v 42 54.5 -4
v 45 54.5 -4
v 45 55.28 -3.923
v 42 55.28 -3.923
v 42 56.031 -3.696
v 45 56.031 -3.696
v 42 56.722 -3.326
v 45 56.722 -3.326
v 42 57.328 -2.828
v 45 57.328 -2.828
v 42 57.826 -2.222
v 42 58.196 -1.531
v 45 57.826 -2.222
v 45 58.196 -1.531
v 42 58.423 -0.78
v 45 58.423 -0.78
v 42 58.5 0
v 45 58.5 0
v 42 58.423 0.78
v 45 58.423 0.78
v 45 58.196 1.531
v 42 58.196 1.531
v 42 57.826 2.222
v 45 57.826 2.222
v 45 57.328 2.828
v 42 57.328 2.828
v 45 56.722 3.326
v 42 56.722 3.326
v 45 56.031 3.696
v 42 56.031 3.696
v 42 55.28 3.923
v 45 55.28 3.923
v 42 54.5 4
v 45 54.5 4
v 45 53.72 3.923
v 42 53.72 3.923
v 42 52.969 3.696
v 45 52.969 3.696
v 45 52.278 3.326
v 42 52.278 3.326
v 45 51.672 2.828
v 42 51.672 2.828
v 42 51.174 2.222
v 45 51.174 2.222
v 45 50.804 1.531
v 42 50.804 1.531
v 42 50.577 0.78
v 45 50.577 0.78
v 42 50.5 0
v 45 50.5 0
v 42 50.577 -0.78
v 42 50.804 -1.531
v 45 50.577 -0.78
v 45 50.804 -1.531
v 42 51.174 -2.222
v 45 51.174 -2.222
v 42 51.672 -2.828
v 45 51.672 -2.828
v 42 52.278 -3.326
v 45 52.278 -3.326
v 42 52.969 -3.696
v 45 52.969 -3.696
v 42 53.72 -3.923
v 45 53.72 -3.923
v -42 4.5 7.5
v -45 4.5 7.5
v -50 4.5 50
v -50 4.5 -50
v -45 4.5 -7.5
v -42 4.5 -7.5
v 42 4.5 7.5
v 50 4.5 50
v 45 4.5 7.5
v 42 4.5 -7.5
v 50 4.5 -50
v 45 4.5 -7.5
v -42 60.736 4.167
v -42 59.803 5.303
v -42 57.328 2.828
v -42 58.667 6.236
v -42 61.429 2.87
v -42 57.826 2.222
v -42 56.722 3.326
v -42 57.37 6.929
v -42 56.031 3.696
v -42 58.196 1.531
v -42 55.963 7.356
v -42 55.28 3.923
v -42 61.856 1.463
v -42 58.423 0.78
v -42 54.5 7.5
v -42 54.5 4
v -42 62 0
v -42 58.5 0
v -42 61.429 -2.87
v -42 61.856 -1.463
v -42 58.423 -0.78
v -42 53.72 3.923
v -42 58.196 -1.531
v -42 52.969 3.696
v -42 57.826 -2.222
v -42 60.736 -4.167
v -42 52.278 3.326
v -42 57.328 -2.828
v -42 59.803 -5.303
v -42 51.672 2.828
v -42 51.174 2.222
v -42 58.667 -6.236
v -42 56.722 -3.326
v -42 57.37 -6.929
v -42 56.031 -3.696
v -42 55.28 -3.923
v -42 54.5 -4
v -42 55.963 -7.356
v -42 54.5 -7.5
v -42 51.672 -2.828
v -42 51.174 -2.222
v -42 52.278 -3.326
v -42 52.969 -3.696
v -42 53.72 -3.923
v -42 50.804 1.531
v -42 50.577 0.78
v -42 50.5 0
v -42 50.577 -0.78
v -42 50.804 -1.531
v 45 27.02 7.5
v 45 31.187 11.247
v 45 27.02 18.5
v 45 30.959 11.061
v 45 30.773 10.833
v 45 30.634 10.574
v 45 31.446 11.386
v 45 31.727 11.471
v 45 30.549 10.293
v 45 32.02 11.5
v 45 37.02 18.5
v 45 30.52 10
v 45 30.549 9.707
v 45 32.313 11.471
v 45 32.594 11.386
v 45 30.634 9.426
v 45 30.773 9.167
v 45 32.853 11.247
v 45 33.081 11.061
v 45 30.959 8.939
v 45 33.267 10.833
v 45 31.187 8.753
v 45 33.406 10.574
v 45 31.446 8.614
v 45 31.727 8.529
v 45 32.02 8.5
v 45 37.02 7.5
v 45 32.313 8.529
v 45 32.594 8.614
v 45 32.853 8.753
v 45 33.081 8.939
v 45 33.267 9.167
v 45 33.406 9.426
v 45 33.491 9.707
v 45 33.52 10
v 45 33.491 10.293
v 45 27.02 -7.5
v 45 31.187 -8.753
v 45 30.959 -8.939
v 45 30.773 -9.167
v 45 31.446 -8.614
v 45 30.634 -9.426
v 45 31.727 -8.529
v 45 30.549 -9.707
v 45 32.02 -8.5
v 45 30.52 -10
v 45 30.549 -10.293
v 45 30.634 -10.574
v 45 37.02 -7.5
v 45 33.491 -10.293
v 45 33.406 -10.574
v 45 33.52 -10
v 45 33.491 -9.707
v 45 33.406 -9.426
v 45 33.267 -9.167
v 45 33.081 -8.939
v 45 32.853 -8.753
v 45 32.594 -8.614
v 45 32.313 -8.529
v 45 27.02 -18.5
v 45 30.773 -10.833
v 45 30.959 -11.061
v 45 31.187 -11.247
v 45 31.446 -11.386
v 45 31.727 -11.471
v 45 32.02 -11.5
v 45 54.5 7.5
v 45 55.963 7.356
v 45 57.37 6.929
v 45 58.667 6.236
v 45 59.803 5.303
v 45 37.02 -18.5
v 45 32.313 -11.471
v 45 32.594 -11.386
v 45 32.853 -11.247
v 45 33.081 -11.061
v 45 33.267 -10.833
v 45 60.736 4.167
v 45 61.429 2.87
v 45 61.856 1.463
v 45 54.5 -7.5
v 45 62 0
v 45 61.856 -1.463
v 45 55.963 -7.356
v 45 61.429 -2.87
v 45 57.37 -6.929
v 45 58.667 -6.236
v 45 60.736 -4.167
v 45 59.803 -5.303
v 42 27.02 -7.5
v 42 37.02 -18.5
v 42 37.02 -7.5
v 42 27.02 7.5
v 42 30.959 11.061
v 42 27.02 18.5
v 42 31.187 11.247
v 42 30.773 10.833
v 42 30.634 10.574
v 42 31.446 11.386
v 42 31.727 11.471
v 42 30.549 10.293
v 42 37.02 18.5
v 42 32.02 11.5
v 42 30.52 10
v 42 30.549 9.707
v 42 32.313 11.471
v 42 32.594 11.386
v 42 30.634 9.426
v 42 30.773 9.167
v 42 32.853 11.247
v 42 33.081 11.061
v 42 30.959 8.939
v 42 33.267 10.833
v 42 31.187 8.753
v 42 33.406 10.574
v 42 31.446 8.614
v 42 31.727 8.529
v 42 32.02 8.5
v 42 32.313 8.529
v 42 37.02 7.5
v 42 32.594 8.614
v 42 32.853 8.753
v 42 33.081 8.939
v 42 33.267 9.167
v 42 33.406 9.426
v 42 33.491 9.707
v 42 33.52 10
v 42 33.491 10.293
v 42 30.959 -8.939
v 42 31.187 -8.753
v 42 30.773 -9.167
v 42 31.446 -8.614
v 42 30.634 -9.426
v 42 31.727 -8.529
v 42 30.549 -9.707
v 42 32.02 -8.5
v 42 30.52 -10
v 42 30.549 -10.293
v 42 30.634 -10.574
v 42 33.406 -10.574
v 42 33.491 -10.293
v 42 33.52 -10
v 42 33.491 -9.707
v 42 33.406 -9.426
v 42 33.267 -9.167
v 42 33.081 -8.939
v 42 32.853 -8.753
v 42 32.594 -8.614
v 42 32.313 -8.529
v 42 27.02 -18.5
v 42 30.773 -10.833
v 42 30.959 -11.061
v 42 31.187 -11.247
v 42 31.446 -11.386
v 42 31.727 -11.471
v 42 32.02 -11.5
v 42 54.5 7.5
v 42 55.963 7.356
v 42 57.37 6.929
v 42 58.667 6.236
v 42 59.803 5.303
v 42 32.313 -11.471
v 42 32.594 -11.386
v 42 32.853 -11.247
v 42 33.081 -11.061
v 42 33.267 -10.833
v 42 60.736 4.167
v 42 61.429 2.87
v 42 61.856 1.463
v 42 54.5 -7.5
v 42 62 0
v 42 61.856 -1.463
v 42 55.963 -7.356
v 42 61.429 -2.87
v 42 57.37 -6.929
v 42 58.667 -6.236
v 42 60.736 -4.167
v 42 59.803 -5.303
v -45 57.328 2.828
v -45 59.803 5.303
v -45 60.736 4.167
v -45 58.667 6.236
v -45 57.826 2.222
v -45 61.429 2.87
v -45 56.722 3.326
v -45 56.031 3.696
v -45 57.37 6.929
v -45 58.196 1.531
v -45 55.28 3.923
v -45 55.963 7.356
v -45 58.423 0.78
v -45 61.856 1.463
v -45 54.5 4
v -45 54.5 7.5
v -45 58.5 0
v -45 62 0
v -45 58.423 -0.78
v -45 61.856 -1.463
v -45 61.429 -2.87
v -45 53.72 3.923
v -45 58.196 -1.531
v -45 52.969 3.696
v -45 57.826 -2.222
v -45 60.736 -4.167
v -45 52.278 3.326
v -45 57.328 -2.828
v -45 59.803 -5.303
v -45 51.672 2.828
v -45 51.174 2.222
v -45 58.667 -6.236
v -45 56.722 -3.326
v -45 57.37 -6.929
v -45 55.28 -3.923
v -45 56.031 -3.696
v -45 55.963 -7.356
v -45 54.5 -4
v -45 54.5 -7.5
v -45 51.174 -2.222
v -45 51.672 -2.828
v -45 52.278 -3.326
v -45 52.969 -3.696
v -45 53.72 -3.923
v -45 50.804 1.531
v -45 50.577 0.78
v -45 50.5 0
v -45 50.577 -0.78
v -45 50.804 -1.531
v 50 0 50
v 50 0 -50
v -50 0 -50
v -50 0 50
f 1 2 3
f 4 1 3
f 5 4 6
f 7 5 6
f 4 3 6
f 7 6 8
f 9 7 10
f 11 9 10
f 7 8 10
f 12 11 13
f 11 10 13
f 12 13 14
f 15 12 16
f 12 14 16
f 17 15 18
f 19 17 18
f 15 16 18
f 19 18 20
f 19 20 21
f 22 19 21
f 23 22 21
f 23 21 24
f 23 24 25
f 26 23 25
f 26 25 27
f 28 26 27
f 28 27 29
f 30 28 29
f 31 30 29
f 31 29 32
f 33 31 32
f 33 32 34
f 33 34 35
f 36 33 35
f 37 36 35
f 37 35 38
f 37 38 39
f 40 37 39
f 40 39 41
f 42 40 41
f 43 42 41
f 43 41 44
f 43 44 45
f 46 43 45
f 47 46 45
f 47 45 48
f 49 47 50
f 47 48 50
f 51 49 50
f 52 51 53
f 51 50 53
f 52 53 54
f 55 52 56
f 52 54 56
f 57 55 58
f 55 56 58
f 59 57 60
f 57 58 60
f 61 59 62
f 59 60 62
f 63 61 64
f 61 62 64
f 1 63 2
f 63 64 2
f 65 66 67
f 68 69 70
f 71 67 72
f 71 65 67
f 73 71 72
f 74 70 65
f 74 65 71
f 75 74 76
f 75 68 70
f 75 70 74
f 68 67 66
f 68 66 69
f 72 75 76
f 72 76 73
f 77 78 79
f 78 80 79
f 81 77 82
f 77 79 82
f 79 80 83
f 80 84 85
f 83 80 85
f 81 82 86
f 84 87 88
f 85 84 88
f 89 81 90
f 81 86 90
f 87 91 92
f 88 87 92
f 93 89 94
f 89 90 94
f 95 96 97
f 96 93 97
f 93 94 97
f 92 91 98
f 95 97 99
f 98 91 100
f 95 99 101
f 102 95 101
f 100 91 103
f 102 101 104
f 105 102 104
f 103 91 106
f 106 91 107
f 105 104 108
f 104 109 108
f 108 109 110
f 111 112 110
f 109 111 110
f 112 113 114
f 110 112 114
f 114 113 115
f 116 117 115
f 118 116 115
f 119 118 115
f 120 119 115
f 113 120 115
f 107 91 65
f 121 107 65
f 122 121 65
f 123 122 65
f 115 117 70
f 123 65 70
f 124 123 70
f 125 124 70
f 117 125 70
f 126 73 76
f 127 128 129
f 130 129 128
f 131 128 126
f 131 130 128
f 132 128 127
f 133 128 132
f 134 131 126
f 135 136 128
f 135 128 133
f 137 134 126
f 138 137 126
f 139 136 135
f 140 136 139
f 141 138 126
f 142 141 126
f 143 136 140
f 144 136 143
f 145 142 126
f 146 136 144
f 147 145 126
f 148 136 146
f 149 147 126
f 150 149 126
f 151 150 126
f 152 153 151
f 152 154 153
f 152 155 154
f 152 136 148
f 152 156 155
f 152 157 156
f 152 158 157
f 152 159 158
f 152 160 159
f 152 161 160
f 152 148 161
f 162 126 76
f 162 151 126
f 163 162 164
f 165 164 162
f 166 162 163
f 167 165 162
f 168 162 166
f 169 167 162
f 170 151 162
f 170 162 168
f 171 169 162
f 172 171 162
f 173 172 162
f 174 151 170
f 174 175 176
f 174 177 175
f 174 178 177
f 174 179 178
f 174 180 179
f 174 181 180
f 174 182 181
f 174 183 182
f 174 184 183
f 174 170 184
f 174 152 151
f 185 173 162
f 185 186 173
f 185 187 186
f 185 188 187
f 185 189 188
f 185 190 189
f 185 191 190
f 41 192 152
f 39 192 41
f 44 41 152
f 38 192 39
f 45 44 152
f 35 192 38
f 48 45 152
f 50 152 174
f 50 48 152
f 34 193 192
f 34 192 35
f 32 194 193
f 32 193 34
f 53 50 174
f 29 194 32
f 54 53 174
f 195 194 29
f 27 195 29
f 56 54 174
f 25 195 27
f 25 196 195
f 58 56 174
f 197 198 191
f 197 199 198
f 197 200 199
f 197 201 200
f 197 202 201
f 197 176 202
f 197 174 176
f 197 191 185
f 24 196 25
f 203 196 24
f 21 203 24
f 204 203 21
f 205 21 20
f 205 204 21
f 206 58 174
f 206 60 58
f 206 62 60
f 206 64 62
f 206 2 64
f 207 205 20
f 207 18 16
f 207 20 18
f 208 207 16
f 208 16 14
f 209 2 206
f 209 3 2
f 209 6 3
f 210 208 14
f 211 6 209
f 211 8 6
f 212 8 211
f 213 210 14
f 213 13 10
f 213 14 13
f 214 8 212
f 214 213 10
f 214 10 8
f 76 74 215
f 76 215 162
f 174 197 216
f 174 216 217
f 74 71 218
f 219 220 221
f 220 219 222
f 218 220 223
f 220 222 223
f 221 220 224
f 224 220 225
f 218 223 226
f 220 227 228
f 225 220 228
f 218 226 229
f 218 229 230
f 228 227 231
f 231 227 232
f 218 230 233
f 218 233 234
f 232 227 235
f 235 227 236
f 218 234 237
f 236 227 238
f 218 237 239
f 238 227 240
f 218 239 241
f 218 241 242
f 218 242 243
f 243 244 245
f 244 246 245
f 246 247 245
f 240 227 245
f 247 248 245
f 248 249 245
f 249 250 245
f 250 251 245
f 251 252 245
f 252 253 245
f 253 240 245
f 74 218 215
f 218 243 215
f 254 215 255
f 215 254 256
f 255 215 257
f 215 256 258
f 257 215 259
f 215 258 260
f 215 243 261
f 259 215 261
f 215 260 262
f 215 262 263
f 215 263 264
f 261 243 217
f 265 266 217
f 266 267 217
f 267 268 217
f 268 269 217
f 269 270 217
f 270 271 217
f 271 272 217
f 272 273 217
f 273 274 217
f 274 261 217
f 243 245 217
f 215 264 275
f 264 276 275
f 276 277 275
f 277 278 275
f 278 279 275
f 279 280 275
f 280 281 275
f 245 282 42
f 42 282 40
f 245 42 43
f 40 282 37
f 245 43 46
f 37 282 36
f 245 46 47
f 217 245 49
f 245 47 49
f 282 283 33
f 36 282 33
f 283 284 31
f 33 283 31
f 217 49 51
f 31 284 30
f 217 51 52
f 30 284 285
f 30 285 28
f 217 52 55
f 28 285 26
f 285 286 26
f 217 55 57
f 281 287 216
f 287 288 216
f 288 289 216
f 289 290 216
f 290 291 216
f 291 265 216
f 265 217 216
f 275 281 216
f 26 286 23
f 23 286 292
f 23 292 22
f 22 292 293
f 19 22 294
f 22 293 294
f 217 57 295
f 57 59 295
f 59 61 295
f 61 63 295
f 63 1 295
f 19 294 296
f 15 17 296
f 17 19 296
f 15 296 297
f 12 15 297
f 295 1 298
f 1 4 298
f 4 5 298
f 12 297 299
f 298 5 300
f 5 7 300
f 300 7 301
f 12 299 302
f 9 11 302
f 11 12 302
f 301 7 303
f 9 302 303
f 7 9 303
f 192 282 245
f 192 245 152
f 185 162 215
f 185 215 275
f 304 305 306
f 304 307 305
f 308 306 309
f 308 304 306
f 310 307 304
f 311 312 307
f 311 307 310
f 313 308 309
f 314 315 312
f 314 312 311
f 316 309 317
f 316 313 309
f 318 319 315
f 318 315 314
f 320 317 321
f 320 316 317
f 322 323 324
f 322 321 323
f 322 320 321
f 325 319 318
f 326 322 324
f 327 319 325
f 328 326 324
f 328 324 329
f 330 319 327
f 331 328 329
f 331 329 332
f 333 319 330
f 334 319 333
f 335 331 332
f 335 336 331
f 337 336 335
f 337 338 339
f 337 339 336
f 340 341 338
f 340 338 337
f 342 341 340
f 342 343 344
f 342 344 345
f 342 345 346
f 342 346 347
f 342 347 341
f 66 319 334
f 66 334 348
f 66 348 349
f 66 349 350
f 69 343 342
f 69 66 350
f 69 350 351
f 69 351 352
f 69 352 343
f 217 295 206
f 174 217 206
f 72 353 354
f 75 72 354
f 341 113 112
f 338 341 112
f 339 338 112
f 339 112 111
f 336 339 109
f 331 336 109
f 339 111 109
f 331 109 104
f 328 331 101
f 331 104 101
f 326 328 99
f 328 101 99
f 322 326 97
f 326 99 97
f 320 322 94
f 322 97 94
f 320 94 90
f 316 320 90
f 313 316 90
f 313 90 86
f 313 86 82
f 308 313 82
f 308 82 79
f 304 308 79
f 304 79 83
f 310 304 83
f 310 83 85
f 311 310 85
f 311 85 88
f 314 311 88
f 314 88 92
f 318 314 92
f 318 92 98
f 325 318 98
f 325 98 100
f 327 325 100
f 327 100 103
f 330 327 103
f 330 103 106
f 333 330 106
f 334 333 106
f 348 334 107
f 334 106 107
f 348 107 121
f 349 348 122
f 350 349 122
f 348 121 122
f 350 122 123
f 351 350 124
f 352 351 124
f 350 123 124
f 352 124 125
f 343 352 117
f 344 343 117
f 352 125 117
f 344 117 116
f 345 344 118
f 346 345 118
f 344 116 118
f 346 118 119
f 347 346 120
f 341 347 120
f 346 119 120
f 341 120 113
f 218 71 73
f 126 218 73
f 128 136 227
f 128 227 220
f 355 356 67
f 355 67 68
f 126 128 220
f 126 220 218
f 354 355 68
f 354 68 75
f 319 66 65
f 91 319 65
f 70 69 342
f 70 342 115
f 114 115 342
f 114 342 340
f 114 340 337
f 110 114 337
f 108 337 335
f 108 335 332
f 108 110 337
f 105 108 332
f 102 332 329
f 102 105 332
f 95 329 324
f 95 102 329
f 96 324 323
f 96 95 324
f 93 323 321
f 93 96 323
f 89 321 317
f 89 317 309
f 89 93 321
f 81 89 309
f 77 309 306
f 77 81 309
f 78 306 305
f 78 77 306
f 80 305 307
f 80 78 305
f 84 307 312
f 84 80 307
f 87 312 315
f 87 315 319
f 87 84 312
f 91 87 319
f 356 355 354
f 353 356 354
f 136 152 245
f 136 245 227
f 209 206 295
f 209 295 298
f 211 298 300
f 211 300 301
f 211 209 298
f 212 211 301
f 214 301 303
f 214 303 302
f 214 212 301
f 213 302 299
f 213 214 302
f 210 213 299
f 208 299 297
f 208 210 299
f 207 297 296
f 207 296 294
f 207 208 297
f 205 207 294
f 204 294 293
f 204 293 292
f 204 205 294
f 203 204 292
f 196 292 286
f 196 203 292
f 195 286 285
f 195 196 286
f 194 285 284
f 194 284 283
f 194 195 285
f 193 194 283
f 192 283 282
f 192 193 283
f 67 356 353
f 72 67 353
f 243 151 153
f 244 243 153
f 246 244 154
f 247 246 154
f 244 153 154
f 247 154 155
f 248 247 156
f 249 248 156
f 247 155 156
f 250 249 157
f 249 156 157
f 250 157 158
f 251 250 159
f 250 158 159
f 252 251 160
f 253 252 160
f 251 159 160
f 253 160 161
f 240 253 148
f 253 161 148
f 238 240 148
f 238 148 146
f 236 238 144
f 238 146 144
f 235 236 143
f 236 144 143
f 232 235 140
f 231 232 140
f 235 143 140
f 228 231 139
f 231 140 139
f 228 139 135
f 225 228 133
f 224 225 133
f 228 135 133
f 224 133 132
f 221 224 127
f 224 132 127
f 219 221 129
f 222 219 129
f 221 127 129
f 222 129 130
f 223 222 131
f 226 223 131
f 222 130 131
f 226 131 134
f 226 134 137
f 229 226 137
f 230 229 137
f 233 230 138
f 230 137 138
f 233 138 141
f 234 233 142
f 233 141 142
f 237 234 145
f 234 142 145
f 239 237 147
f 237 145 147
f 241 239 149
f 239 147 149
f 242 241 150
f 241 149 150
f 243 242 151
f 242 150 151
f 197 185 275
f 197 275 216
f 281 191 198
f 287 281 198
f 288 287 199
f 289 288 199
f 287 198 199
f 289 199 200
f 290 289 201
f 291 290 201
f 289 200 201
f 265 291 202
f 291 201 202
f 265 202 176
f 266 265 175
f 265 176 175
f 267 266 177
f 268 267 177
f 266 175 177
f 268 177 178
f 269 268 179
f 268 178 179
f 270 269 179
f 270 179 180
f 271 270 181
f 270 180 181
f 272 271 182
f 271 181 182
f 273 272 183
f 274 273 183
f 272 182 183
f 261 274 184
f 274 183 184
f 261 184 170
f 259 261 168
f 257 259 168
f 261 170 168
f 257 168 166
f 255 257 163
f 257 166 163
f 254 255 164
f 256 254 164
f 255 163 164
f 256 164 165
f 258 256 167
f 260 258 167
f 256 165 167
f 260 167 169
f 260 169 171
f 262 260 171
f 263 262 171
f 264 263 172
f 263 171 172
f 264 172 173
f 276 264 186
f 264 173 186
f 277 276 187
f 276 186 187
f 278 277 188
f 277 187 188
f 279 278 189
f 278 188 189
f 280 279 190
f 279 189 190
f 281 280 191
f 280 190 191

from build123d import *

# Parameters (mm, degrees)
SKETCH1_W           = 100
SKETCH1_H           = 100
BOSS_EXTRUDE1_DEPTH = 4.5
SKETCH2_W           = 3
SKETCH2_H           = 15
BOSS_EXTRUDE2_DEPTH = 60
SKETCH3_R           = 4
CUT_EXTRUDE1_DEPTH  = 96
SKETCH4_R           = 1.5
BOSS_EXTRUDE3_DEPTH = 3


with BuildPart() as part:
    # Sketch1 → Boss-Extrude1 (new body)
    with BuildSketch(Plane(origin=(0, 0, 0), x_dir=(1, 0, 0), z_dir=(0, 1, 0))):
        Rectangle(SKETCH1_W, SKETCH1_H)
    extrude(amount=BOSS_EXTRUDE1_DEPTH)

    # Sketch2 → Boss-Extrude2 (add)
    with BuildSketch(Plane(origin=(0, 4.5, 0), x_dir=(1, 0, 0), z_dir=(0, 1, 0))):
        with Locations((43.5, 0)):
            Rectangle(SKETCH2_W, SKETCH2_H)
        with Locations((-43.5, 0)):
            Rectangle(SKETCH2_W, SKETCH2_H)
    extrude(amount=BOSS_EXTRUDE2_DEPTH)

    # Sketch3 → Cut-Extrude1 (cut, through all)
    with BuildSketch(Plane(origin=(45, 0, 0), x_dir=(0, 0, -1), z_dir=(1, 0, 0))):
        with Locations((0, 54.5)):
            Circle(SKETCH3_R)
        with BuildLine():
            Line((-7.5, 54.5), (-7.5, 64.5))
            Line((-7.5, 64.5), (7.5, 64.5))
            Line((7.5, 64.5), (7.5, 54.5))
            ThreePointArc((7.5, 54.5), (0, 62), (-7.5, 54.5))
        make_face()
    extrude(amount=-CUT_EXTRUDE1_DEPTH, mode=Mode.SUBTRACT)

    # Sketch4 → Boss-Extrude3 (add)
    with BuildSketch(Plane(origin=(45, 0, 0), x_dir=(0, 0, -1), z_dir=(1, 0, 0))):
        Polygon((0, 27.02), (18.5, 27.02), (18.5, 37.02), (-18.5, 37.02), (-18.5, 27.02), align=None)
        with Locations((-10, 32.02)):
            Circle(SKETCH4_R, mode=Mode.SUBTRACT)
        with Locations((10, 32.02)):
            Circle(SKETCH4_R, mode=Mode.SUBTRACT)
    extrude(amount=-BOSS_EXTRUDE3_DEPTH)


solid = part.part
